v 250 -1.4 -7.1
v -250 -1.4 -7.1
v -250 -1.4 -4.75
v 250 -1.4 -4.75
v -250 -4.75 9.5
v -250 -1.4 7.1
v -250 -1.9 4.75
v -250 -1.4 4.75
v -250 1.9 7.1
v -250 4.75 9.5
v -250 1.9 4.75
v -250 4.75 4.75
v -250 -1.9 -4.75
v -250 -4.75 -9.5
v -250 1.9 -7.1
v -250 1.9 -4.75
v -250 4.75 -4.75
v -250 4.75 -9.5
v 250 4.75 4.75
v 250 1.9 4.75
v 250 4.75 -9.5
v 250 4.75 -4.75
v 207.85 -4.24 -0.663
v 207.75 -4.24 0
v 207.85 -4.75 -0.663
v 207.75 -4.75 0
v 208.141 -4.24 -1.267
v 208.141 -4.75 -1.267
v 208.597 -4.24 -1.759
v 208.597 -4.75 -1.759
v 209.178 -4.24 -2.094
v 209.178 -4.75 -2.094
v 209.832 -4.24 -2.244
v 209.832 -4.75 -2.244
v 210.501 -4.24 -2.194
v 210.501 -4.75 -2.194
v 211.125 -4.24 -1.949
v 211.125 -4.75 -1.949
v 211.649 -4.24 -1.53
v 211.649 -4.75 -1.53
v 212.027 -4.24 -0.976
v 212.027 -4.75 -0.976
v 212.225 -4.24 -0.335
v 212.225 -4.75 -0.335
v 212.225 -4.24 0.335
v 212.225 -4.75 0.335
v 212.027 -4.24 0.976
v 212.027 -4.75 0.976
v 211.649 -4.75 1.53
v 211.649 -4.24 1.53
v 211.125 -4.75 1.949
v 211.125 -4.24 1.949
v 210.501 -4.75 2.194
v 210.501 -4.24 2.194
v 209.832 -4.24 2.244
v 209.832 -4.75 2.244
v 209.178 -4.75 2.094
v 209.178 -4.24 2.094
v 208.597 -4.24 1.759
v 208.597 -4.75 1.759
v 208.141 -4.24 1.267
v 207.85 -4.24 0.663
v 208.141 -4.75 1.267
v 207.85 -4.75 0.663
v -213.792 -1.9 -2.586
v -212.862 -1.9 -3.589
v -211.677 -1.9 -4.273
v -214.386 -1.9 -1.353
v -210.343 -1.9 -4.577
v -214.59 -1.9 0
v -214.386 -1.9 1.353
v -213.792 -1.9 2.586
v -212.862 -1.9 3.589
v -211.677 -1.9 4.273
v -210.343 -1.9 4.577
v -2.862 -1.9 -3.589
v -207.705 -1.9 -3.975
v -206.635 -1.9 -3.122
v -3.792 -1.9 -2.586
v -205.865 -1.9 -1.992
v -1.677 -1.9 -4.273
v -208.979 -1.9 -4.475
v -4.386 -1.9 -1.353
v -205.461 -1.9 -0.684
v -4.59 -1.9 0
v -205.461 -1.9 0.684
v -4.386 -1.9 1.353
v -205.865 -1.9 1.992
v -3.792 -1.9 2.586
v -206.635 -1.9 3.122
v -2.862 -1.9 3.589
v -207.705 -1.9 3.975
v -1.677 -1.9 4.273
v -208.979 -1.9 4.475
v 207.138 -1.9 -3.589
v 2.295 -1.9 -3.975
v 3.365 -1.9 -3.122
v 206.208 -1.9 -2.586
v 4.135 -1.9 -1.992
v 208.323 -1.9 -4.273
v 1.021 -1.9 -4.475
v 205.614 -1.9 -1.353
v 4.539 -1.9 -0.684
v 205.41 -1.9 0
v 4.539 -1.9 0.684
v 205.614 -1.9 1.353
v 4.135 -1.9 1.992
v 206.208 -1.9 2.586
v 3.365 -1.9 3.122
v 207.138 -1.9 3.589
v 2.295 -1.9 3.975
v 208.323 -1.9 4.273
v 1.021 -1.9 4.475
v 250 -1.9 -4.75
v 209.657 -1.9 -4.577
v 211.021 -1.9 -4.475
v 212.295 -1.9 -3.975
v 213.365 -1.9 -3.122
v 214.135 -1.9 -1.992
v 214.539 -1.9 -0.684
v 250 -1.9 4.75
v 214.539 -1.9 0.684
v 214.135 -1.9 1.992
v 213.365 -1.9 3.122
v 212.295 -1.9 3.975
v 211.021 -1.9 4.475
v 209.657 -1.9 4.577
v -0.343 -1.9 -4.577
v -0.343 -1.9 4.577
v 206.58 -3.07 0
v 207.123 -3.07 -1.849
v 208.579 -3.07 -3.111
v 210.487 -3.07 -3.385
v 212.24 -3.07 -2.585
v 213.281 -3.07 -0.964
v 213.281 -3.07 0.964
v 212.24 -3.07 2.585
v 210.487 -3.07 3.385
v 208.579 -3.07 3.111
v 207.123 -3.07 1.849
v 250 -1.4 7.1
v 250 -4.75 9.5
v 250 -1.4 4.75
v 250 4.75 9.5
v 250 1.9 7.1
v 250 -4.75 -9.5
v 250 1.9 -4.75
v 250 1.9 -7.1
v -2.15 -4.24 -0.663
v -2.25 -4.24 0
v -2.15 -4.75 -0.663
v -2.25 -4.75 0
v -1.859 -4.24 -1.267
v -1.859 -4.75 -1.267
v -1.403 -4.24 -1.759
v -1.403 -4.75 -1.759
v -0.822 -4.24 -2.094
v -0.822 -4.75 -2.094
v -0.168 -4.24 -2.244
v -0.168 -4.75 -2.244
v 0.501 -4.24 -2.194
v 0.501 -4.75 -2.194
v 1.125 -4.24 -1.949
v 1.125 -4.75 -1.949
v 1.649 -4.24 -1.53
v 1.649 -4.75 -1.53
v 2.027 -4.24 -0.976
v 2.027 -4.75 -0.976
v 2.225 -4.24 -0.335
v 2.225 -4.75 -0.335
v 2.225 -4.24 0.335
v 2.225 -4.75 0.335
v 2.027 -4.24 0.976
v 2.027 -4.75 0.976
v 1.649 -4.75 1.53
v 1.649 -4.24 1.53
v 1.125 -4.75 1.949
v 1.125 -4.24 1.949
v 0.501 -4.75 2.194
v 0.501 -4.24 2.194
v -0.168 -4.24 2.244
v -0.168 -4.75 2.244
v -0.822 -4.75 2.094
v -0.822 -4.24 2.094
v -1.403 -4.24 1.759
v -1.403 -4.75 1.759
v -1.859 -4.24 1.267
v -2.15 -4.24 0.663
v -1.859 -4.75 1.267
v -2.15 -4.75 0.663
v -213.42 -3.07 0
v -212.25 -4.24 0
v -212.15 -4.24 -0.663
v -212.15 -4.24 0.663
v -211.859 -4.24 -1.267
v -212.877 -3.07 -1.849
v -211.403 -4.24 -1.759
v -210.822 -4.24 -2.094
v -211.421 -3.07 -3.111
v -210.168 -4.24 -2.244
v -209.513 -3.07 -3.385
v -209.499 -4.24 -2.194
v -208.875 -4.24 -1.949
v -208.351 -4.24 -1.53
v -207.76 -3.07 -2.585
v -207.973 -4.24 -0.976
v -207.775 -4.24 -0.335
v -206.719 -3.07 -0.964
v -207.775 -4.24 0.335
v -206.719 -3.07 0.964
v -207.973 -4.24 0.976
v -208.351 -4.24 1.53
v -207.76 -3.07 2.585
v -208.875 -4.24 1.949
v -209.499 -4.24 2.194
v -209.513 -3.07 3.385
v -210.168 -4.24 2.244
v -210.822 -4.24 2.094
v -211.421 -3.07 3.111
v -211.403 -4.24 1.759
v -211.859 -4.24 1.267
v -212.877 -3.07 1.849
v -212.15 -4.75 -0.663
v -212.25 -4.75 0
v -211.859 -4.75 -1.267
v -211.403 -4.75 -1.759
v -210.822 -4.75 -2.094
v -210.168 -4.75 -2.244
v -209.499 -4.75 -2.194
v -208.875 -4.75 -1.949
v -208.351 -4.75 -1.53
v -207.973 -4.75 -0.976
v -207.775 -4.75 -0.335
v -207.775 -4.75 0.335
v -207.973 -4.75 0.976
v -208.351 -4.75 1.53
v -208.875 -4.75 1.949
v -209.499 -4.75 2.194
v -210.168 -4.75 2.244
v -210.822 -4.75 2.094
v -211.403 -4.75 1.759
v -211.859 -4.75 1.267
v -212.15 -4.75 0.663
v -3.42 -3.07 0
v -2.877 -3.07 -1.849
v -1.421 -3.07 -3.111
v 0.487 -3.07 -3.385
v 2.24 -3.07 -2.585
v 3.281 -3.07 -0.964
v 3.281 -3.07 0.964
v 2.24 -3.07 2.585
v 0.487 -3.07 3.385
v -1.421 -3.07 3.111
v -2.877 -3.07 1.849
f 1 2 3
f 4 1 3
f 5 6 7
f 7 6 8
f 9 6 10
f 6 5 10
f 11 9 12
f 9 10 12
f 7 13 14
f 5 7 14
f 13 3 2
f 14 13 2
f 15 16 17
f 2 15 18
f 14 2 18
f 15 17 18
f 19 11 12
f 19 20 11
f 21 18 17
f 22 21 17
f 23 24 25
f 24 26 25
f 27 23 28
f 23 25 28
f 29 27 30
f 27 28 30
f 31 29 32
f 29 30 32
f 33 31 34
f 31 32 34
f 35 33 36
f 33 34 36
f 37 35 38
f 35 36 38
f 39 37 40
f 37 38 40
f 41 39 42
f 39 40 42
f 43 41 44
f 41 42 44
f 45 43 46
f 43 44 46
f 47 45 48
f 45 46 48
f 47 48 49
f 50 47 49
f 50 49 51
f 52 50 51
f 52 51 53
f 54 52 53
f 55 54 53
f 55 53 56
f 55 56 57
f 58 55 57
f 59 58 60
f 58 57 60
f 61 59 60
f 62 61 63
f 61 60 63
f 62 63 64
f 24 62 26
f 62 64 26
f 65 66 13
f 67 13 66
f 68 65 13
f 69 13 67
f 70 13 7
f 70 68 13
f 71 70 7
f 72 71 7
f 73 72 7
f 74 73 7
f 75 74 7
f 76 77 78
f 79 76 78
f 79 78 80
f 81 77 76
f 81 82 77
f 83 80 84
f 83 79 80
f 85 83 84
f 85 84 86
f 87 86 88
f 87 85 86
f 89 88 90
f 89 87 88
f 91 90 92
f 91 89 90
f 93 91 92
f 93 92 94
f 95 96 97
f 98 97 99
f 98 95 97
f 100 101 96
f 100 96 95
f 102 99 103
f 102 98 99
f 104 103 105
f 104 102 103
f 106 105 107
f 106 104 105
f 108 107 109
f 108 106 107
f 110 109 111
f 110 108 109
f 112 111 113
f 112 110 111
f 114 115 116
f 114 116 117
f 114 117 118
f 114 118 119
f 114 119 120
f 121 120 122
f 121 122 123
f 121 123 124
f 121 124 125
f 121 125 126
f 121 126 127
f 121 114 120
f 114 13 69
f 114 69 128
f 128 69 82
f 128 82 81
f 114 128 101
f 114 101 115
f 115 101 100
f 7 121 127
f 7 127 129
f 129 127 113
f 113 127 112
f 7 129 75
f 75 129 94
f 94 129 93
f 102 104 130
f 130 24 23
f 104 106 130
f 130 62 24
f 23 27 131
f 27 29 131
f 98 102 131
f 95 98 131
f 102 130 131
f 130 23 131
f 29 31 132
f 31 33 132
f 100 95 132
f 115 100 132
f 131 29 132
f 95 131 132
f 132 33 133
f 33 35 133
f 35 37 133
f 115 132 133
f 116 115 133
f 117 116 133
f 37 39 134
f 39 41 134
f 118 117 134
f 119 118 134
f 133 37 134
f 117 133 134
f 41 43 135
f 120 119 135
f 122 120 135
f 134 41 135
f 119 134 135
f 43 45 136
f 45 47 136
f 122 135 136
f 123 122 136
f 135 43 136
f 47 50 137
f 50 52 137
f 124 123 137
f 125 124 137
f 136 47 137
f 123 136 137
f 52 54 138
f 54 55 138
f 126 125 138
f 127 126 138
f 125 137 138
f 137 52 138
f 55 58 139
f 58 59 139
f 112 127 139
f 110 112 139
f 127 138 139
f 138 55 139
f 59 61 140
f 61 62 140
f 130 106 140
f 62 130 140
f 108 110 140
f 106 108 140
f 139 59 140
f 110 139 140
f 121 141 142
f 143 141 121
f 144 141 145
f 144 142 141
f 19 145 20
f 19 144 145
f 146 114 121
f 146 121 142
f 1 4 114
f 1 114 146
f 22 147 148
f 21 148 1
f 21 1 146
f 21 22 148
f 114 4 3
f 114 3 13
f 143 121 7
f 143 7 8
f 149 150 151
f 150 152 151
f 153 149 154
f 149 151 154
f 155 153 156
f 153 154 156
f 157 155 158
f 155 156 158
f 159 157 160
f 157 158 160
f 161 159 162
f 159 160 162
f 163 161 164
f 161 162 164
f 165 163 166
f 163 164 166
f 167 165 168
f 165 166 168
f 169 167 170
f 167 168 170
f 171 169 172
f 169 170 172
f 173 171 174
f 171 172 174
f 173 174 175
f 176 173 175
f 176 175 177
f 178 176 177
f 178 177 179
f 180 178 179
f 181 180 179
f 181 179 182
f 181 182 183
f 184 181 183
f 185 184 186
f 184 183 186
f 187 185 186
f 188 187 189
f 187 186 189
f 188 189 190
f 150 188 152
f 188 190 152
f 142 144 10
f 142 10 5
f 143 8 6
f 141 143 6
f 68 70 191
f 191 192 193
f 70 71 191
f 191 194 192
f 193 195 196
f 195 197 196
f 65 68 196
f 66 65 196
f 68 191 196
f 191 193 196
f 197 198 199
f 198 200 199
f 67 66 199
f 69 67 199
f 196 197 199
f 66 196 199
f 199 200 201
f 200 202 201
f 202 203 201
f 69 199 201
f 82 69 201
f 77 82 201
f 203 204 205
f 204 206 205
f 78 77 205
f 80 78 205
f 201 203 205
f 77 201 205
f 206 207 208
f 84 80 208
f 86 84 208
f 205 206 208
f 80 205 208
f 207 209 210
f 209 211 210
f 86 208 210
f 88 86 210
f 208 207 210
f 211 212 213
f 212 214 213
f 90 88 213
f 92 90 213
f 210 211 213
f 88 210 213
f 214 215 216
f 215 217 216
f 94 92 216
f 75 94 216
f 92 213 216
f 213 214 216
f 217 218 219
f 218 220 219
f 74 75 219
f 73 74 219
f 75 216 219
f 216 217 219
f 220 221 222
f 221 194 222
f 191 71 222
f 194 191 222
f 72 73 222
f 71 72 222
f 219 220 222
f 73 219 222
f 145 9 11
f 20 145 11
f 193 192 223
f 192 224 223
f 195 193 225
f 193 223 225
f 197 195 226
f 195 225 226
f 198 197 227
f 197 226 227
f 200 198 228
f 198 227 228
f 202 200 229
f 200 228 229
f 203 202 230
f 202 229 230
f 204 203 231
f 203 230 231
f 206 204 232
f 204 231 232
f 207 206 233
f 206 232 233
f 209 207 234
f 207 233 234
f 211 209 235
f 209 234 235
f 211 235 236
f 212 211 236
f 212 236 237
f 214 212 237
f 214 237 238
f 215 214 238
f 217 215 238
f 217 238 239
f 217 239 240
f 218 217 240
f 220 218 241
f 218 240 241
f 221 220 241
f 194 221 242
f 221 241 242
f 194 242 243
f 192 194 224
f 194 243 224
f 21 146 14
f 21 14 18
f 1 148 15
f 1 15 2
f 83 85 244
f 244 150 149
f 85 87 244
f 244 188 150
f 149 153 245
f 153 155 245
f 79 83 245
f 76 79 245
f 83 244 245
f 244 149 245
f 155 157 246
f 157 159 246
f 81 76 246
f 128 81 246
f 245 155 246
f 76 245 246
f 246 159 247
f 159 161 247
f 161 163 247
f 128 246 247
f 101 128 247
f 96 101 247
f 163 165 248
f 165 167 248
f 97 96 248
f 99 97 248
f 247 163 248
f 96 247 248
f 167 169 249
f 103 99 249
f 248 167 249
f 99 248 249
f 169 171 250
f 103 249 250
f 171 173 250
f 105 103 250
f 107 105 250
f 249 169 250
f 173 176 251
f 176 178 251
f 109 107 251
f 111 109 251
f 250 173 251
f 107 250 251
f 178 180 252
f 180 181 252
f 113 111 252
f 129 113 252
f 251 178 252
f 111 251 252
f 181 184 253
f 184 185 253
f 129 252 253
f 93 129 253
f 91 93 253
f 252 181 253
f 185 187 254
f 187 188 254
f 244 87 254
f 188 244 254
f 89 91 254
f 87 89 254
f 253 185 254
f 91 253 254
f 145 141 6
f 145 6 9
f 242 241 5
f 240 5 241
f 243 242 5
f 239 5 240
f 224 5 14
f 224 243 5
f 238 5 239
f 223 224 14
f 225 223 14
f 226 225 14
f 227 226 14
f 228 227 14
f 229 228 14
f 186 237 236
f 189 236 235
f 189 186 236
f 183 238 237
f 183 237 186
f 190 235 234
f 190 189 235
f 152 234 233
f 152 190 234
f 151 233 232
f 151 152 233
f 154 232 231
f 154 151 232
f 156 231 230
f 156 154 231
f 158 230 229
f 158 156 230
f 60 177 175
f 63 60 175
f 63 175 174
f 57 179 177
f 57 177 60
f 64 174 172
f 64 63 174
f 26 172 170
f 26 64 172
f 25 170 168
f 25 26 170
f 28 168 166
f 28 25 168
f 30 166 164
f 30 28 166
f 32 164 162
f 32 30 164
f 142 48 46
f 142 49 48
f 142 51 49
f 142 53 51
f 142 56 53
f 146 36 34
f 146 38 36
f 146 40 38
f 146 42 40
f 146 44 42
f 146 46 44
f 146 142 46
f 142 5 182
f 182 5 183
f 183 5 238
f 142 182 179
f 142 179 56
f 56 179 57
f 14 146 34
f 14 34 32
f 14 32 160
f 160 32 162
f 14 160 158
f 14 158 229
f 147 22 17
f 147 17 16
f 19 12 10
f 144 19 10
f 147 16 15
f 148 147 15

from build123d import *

# Parameters (mm, degrees)
BOSS_EXTRUDE1_DEPTH                                  = 250
CSK_FOR_M4_HEX_SOCKET_COUNTERSUNK_HEAD_S_D           = 4.5
CSK_FOR_M4_HEX_SOCKET_COUNTERSUNK_HEAD_S_DEPTH       = 5.4
CSK_FOR_M4_HEX_SOCKET_COUNTERSUNK_HEAD_S_CSINK_D     = 9.18
CSK_FOR_M4_HEX_SOCKET_COUNTERSUNK_HEAD_S_CSINK_ANGLE = 90
CSK_FOR_M4_HEX_SOCKET_COUNTERSUNK_HEAD_S_TIP         = 1.351936393


with BuildPart() as part:
    # Sketch1 → Boss-Extrude1 (new, symmetric)
    with BuildSketch(Plane(origin=(0, 0, 0), x_dir=(0, 0, -1), z_dir=(1, 0, 0))):
        Polygon((-4.75, 4.75), (-9.5, 4.75), (-9.5, -4.75), (9.5, -4.75), (9.5, 4.75), (4.75, 4.75), (4.75, 1.9), (7.1, 1.9), (7.1, -1.4), (4.75, -1.4), (4.75, -1.9), (-4.75, -1.9), (-4.75, -1.4), (-7.1, -1.4), (-7.1, 1.9), (-4.75, 1.9), align=None)
    extrude(amount=BOSS_EXTRUDE1_DEPTH, both=True)

    # CSK for M4 Hex Socket Countersunk Head Screw1
    with Locations(Plane(origin=(0, -1.9, 0), x_dir=(1, 0, 0), z_dir=(0, 1, 0))):
        with Locations((0, 0), (-210, 0), (210, 0)):
            CounterSinkHole(CSK_FOR_M4_HEX_SOCKET_COUNTERSUNK_HEAD_S_D / 2, CSK_FOR_M4_HEX_SOCKET_COUNTERSUNK_HEAD_S_CSINK_D / 2, depth=CSK_FOR_M4_HEX_SOCKET_COUNTERSUNK_HEAD_S_DEPTH, counter_sink_angle=CSK_FOR_M4_HEX_SOCKET_COUNTERSUNK_HEAD_S_CSINK_ANGLE)
            with Locations((0, 0, -(CSK_FOR_M4_HEX_SOCKET_COUNTERSUNK_HEAD_S_DEPTH + CSK_FOR_M4_HEX_SOCKET_COUNTERSUNK_HEAD_S_TIP / 2))):  # 118° drill point
                Cone(0, CSK_FOR_M4_HEX_SOCKET_COUNTERSUNK_HEAD_S_D / 2, CSK_FOR_M4_HEX_SOCKET_COUNTERSUNK_HEAD_S_TIP, mode=Mode.SUBTRACT)


solid = part.part
